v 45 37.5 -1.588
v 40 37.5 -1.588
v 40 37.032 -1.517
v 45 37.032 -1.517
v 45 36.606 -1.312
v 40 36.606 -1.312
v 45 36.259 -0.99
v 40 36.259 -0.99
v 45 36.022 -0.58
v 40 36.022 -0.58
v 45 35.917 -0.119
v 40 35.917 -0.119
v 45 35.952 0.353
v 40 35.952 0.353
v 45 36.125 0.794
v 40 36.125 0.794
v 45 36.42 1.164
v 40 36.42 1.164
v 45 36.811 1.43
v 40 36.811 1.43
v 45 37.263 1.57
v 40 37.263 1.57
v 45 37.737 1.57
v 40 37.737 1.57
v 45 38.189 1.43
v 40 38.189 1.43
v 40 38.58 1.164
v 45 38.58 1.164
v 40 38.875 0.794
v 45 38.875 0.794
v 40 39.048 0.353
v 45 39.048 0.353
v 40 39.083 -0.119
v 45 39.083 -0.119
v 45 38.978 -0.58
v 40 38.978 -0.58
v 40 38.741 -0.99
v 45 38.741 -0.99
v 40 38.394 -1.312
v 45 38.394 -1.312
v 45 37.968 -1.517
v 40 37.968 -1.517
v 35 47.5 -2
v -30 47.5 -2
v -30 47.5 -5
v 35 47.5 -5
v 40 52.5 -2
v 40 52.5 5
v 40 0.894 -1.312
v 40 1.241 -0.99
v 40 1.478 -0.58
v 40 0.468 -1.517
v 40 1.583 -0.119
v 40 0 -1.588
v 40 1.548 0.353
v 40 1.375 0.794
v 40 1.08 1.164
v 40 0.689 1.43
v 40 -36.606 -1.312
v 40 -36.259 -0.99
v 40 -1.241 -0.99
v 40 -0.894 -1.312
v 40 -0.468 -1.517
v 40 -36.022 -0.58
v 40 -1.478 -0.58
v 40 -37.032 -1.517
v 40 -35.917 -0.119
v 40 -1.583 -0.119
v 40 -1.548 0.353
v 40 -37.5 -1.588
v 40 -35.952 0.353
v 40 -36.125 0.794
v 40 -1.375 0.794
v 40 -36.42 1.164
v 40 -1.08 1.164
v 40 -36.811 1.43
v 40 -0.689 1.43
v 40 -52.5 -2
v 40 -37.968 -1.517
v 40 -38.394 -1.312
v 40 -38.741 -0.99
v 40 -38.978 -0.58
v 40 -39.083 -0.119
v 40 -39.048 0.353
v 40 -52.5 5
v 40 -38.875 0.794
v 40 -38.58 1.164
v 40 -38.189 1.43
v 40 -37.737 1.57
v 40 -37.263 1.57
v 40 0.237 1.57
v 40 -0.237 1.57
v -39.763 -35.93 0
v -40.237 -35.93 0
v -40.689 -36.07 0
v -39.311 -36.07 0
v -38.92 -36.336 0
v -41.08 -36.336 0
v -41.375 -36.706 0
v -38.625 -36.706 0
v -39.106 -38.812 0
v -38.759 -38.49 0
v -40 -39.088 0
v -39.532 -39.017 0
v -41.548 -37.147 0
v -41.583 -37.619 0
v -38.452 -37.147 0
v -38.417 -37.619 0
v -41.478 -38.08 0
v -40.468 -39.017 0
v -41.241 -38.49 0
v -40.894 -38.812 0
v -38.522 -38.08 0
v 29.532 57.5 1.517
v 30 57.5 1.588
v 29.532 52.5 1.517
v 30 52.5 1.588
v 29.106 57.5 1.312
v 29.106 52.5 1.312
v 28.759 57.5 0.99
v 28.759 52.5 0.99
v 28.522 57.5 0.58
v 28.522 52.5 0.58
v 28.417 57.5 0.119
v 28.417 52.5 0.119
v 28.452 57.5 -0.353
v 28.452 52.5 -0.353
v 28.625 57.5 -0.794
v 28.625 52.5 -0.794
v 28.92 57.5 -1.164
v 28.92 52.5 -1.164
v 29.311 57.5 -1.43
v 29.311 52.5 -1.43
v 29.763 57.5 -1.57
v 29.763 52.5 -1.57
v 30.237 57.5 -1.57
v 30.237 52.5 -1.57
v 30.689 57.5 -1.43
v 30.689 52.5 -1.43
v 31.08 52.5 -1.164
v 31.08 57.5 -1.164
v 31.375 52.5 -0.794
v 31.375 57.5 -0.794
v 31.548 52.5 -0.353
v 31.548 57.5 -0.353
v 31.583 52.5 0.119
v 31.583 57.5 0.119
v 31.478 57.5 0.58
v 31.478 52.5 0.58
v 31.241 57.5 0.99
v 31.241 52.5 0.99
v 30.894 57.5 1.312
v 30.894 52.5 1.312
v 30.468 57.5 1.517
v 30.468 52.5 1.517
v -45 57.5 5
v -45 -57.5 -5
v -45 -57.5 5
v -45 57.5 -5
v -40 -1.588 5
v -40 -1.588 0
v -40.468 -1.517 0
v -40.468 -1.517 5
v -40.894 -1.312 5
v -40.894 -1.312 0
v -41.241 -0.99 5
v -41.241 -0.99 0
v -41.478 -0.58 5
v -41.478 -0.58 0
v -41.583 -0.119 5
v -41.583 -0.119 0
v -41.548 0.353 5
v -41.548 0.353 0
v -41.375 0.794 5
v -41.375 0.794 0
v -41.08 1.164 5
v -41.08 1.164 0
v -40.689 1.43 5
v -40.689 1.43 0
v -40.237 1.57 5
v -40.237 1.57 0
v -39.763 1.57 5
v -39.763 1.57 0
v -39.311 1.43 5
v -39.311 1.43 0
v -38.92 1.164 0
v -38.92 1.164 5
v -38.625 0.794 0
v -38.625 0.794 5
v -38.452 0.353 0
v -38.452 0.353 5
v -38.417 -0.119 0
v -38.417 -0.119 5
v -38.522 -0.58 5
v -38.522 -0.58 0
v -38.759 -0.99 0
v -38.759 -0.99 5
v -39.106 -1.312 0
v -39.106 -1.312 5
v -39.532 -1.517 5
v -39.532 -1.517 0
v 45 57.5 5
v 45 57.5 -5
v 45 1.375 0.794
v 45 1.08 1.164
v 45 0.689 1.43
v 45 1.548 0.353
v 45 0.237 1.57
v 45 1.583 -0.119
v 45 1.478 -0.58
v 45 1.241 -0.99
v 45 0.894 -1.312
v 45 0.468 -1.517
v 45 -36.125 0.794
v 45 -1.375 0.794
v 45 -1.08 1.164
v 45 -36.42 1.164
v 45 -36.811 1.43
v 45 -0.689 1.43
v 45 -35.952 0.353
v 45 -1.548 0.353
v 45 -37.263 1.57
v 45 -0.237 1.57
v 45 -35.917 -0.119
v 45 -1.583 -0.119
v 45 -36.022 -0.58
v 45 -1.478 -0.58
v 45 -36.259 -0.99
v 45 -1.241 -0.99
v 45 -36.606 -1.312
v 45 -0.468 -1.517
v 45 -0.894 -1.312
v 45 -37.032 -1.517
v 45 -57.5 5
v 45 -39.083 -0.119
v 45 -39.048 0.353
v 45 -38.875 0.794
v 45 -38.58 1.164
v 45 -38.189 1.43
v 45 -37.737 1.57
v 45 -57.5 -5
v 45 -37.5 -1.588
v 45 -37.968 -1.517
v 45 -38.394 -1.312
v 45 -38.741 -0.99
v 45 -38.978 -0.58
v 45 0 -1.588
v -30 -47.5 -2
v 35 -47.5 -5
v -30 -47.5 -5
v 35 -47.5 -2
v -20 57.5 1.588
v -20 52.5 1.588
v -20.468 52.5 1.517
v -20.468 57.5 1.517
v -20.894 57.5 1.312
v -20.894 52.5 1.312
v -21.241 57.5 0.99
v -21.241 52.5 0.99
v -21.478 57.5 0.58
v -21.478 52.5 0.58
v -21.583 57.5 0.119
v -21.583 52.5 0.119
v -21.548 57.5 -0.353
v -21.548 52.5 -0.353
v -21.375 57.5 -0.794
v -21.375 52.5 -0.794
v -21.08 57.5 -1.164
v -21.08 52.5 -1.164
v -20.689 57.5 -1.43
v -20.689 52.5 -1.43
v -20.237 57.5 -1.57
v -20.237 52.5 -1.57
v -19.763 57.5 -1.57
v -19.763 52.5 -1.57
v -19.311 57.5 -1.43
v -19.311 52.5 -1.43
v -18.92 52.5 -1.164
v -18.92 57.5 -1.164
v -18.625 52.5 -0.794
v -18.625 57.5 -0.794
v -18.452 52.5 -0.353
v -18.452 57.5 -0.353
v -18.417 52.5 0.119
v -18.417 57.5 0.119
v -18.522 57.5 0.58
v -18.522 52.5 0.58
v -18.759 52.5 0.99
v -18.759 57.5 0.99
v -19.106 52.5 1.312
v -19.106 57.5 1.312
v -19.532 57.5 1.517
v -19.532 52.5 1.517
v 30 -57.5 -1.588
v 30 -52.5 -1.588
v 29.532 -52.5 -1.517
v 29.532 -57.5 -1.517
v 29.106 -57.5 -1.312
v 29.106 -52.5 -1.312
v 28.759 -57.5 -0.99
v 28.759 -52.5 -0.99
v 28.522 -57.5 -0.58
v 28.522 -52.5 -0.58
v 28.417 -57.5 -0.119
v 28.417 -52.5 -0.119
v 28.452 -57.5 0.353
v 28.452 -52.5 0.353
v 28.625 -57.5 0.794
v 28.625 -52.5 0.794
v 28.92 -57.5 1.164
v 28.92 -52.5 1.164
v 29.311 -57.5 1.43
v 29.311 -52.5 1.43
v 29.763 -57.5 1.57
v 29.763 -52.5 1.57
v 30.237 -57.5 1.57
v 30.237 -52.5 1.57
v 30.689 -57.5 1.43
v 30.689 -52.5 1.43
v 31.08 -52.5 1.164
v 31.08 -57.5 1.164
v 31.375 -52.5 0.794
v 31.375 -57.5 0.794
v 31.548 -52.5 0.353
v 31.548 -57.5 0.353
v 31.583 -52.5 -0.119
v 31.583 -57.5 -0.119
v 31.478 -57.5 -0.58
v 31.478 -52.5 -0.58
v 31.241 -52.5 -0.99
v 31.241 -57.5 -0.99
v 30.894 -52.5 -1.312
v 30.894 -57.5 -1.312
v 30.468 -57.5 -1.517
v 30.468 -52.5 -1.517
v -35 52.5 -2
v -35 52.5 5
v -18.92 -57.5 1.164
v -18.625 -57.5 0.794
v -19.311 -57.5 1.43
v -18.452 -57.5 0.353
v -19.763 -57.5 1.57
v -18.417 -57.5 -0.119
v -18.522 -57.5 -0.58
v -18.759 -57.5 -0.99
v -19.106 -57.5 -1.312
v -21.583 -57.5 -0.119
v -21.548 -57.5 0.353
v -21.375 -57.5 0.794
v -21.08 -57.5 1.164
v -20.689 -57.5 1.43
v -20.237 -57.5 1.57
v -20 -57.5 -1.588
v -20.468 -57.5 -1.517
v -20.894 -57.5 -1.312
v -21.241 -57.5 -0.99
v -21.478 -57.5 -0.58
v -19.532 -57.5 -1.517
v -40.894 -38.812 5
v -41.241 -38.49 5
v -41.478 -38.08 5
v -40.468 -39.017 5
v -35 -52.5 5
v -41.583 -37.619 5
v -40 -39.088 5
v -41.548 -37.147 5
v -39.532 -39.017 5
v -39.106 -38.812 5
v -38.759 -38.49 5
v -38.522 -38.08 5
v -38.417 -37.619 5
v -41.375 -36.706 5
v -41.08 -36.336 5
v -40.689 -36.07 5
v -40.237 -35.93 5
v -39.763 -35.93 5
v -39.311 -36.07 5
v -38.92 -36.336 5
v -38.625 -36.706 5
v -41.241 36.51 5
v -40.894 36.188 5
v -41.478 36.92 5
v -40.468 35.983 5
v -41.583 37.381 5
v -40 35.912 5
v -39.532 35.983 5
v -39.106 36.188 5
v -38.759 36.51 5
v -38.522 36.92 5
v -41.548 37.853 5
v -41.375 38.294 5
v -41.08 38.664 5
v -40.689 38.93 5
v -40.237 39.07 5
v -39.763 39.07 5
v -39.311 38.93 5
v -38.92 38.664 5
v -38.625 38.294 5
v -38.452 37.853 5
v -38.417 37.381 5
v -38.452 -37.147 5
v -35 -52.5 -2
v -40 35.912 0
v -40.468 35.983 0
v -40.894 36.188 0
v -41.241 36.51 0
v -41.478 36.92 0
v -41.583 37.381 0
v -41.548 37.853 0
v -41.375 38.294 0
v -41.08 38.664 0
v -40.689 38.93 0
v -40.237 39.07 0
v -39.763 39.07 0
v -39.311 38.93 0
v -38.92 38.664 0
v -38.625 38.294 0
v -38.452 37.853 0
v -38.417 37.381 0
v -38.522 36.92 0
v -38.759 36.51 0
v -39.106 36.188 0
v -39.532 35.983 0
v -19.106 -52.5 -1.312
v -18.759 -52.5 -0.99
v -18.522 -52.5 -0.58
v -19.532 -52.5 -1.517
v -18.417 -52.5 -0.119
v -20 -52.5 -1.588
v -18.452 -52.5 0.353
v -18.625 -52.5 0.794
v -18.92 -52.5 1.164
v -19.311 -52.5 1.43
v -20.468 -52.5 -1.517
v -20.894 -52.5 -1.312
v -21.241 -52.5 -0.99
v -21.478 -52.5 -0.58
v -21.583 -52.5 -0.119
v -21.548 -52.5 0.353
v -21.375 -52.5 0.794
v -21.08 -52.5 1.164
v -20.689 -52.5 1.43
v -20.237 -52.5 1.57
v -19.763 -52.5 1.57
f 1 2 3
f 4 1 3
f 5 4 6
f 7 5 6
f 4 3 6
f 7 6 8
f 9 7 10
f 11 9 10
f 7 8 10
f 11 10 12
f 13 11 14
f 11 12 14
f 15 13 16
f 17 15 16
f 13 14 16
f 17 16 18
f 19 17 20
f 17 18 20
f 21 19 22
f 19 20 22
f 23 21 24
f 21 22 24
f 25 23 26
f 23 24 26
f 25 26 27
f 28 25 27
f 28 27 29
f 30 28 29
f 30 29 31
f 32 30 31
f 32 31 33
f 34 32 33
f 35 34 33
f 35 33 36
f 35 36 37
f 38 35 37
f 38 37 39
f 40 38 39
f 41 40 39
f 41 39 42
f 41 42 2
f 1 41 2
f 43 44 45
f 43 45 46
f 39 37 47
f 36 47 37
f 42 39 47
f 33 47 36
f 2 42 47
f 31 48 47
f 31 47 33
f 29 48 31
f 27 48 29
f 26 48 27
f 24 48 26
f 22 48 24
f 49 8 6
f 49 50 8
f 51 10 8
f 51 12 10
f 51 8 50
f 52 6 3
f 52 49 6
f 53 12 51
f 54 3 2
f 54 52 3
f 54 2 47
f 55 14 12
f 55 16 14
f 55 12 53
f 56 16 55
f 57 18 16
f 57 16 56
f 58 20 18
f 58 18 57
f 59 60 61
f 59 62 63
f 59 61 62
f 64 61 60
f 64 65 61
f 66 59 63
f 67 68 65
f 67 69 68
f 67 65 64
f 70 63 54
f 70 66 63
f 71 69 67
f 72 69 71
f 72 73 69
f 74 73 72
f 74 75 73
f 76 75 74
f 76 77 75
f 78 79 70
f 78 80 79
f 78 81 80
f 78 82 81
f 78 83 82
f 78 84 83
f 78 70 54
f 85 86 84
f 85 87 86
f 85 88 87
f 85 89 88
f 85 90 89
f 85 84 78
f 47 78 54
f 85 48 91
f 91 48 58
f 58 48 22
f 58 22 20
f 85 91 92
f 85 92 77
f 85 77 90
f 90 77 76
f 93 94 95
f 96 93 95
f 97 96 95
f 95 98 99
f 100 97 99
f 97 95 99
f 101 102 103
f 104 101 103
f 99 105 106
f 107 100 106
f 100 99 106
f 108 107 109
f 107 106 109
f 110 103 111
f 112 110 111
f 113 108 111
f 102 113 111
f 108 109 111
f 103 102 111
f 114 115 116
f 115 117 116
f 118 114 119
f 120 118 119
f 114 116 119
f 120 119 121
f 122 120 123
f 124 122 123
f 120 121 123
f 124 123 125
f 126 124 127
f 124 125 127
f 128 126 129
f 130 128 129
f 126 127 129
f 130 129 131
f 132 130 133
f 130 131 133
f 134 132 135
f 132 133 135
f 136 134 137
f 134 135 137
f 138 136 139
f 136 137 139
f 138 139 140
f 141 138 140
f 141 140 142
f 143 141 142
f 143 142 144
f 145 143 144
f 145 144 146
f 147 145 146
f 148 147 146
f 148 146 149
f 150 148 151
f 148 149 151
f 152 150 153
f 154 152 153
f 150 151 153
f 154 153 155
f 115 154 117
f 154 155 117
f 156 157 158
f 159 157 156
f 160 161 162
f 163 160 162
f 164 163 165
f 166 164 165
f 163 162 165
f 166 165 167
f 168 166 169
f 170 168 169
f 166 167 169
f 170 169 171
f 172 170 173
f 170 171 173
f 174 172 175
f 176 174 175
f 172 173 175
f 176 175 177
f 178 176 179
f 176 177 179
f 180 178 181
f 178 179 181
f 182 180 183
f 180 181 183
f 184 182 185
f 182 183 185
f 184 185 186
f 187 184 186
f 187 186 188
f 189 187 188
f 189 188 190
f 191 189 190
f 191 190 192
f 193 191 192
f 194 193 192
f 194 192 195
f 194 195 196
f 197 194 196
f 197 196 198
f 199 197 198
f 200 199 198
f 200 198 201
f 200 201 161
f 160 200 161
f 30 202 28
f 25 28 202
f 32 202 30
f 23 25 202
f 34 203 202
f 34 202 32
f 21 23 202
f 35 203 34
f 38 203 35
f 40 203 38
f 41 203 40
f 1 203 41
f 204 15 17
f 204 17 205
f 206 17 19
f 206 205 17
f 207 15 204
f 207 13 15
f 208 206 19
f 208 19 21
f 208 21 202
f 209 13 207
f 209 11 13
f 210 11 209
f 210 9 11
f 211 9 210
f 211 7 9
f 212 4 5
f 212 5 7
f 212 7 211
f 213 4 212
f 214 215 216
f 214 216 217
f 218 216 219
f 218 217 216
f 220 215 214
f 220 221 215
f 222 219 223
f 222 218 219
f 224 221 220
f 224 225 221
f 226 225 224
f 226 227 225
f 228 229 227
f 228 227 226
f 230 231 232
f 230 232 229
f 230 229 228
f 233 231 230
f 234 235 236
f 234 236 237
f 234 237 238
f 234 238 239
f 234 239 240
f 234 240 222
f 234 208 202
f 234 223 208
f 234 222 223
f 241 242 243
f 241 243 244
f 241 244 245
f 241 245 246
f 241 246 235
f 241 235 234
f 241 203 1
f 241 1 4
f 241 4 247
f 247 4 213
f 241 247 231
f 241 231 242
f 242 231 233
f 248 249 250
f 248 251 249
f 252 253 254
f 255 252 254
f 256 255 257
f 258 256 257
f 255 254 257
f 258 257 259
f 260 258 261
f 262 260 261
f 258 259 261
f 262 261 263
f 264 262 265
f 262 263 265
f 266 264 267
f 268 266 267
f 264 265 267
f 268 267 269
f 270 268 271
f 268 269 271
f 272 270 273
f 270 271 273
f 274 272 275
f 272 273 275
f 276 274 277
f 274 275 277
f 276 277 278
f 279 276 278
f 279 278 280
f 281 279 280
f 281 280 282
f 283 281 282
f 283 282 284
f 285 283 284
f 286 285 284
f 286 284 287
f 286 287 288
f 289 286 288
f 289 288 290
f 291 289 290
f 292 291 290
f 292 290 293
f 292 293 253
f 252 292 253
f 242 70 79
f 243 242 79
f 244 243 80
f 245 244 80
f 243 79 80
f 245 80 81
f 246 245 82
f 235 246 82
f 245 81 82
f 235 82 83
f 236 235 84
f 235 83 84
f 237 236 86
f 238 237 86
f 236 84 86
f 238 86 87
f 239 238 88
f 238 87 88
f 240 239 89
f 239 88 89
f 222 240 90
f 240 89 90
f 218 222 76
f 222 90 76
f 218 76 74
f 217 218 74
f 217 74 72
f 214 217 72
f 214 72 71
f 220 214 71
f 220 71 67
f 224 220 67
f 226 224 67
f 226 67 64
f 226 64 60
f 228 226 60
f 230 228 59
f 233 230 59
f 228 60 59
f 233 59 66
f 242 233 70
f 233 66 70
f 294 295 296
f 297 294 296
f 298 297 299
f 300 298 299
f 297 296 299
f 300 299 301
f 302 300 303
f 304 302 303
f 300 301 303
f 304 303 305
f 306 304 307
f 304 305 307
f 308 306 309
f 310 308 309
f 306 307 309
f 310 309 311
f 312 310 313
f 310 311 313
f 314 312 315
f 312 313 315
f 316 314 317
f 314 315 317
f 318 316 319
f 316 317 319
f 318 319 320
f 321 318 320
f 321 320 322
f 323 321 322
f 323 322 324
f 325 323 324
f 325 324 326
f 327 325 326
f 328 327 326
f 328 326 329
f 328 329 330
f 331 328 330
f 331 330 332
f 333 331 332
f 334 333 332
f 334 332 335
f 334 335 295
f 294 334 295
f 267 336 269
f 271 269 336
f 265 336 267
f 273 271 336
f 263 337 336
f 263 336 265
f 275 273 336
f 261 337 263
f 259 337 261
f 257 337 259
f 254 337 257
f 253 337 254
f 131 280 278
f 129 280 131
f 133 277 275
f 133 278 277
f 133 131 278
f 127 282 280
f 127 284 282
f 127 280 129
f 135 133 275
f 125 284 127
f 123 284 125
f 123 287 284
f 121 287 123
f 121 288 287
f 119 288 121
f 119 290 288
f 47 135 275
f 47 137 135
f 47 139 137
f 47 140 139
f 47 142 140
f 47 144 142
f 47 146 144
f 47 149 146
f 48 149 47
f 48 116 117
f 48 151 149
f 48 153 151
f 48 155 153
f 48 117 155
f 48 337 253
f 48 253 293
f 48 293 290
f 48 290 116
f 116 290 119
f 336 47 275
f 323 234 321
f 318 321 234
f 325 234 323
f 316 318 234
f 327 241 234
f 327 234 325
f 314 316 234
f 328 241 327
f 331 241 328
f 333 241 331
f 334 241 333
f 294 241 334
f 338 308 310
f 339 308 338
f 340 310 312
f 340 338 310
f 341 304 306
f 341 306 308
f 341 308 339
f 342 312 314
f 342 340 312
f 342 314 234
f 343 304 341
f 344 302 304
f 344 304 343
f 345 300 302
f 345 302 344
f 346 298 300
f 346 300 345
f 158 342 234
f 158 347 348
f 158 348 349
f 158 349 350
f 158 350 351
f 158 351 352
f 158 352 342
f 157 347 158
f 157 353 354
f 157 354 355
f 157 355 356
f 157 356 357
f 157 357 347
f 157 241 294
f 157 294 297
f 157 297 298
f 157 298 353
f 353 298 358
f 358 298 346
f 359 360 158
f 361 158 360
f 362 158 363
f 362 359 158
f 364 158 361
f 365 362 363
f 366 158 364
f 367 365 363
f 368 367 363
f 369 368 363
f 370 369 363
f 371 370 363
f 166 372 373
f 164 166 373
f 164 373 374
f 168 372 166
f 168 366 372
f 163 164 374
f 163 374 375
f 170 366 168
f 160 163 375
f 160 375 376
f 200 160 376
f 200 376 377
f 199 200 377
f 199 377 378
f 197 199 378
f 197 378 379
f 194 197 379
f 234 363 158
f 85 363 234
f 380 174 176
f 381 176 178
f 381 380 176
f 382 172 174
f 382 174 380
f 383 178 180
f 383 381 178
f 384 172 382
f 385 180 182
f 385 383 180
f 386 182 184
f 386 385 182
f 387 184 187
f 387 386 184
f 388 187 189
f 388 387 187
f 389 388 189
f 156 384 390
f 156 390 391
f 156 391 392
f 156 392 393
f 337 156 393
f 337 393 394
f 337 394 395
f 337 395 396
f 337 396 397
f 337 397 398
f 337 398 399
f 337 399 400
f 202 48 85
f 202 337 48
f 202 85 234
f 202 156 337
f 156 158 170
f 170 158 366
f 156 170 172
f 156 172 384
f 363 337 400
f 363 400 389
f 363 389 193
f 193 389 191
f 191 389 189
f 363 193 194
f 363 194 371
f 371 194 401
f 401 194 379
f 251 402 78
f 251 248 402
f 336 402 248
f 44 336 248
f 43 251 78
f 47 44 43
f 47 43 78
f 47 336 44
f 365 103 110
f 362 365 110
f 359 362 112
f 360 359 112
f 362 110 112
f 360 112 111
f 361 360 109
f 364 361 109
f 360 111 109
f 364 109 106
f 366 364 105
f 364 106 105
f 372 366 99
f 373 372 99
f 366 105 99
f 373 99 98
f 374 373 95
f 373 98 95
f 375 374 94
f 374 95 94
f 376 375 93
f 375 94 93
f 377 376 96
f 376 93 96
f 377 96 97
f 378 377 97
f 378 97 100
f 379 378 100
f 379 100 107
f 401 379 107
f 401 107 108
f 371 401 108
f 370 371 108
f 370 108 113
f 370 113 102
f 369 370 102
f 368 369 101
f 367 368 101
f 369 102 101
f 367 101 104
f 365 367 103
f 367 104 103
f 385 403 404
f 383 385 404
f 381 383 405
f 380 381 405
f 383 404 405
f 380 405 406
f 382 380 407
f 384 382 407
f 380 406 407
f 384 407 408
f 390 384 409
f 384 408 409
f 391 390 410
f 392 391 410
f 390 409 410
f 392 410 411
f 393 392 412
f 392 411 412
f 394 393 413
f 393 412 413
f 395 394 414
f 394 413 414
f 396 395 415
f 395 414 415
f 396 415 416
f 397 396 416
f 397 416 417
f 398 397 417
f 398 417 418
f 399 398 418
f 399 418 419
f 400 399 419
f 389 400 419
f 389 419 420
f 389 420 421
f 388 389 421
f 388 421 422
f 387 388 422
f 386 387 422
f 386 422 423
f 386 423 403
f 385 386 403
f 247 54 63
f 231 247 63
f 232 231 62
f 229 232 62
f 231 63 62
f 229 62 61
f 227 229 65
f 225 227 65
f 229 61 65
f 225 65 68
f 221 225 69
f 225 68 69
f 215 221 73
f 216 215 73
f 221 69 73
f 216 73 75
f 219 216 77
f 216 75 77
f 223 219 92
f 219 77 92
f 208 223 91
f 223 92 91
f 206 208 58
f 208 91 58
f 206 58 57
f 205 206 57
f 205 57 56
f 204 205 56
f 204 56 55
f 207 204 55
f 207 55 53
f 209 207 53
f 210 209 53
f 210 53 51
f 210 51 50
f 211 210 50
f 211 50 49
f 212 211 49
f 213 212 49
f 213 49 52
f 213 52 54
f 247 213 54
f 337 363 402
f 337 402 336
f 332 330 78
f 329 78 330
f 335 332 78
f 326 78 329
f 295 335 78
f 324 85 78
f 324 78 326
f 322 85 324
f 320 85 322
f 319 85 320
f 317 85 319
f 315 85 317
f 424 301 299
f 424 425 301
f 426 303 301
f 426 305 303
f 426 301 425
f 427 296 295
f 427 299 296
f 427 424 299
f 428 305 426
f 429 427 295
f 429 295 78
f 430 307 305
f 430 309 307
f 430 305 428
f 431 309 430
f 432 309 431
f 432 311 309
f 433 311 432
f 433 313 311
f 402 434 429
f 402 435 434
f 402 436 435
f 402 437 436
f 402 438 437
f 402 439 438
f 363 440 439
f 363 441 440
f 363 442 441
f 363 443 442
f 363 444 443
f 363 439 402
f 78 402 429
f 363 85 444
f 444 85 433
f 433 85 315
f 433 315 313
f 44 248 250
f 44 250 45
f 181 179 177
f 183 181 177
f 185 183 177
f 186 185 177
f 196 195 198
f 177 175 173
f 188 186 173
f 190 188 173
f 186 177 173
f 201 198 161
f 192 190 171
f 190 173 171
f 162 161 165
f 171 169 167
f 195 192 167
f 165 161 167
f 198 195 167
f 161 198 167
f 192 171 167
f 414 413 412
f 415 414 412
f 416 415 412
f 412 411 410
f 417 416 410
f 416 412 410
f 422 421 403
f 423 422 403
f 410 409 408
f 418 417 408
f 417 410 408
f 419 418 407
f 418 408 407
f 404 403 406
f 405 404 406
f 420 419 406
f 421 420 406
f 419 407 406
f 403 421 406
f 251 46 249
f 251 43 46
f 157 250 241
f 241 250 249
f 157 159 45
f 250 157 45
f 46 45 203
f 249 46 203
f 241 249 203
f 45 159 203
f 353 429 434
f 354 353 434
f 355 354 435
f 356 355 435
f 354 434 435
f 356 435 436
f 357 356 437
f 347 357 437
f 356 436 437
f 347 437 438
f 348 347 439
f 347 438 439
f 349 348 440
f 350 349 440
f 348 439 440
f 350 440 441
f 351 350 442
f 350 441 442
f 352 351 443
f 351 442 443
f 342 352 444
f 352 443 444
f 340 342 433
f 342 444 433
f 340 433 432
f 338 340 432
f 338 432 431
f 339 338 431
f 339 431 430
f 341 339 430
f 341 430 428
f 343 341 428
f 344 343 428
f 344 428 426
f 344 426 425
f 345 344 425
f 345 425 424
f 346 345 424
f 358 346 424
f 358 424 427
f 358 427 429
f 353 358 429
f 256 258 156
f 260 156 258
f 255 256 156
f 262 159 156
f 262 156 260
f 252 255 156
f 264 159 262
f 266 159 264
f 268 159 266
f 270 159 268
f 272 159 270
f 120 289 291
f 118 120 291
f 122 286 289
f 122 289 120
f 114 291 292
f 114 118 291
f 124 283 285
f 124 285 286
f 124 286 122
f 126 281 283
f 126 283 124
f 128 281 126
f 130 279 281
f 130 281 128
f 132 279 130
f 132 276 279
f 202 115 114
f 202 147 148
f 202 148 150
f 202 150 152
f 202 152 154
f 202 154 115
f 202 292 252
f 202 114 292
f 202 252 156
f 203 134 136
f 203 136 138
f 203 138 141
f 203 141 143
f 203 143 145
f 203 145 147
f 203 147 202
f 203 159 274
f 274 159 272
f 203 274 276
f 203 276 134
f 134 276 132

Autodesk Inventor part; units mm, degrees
ref_plane "YZ Plane" through (0, 0, 0) normal (1, 0, 0) x (0, 1, 0)
ref_plane "XZ Plane" through (0, 0, 0) normal (0, 1, 0) x (-1, 0, 0)
ref_plane "XY Plane" through (0, 0, 0) normal (0, 0, 1) x (1, 0, 0)
sketch "Sketch1" plane through (0, 0, 0) normal (0, 0, 1) x (1, 0, 0)
  line L0 (-45, 57.5) -> (45, 57.5)
  line L1 (45, 57.5) -> (45, -57.5)
  line L2 (45, -57.5) -> (-45, -57.5)
  line L3 (-45, -57.5) -> (-45, 57.5)
  line L4 (-45, 57.5) -> (45, -57.5) construction
  line L5 (45, 57.5) -> (-45, -57.5) construction
  point P0 (0, 0)
  dimension "d0" = 90
  dimension "d1" = 115
extrude "Extrusion1" add sketch "Sketch1" along normal mid plane 10
sketch "Sketch2" plane through (45, -57.5, 5) normal (1, 0, 0) x (0, 0, -1)
  line L0 (10, 0) -> (0, 0) projected
  line L1 (10, 115) -> (10, 0) projected
  point P0 (5, 57.5)
  point P1 (5, 20)
  point P2 (5, 57.5)
  point P3 (5, 95)
  dimension "d4" = 20
  dimension "d5" = 5
  dimension "d8" = 37.5
hole "Hole1" at (45, -37.5, 0) at (45, 0, 0) at (45, 37.5, 0) direction (-1, 0, 0) diameter 3.175 depth 5
sketch "Sketch3" plane through (-45, -57.5, 5) normal (0, -1, 0) x (1, 0, 0)
  line L0 (0, 0) -> (0, -10) projected
  line L1 (90, -10) -> (0, -10) projected
  point P0 (45, -5)
  point P1 (25, -5)
  point P2 (75, -5)
  dimension "d20" = 25
  dimension "d21" = 5
  dimension "d24" = 50
hole "Hole2" at (-20, -57.5, 0) at (30, -57.5, 0) direction (0, 1, 0) diameter 3.175 depth 5
sketch "Sketch4" plane through (-45, 57.5, 5) normal (0, 1, 0) x (1, 0, 0)
  line L0 (0, 10) -> (0, 0) projected
  line L1 (90, 0) -> (0, 0) projected
  point P0 (45, 5)
  point P1 (25, 5)
  point P2 (75, 5)
  dimension "d36" = 25
  dimension "d37" = 5
  dimension "d40" = 50
hole "Hole3" at (-20, 57.5, 0) at (30, 57.5, 0) direction (0, -1, 0) diameter 3.175 depth 5
sketch "Sketch5" plane through (0, 0, 5) normal (0, 0, 1) x (1, 0, 0)
  line L0 (-45, 57.5) -> (-45, -57.5) projected
  line L1 (-45, -57.5) -> (45, -57.5) projected
  point P0 (0, 0)
  point P1 (-40, -37.5)
  point P2 (-40, 0)
  point P3 (-40, 37.5)
  dimension "d52" = 5
  dimension "d53" = 20
  dimension "d56" = 37.5
hole "Hole4" at (-40, -37.5, 5) at (-40, 0, 5) at (-40, 37.5, 5) direction (0, 0, -1) diameter 3.175 depth 5
sketch "Sketch6" plane through (0, 0, 5) normal (0, 0, 1) x (1, 0, 0)
  line L0 (40, -52.5) -> (-35, -52.5)
  line L1 (-35, -52.5) -> (-35, 52.5)
  line L2 (-35, 52.5) -> (40, 52.5)
  line L3 (40, 52.5) -> (40, -52.5)
  line L4 (40, -52.5) -> (-35, 52.5) construction
  line L5 (-35, -52.5) -> (40, 52.5) construction
  line L6 (-45, 57.5) -> (-45, -57.5) projected
  line L7 (45, 57.5) -> (-45, 57.5) projected
  line L8 (45, -57.5) -> (45, 57.5) projected
  line L9 (-45, -57.5) -> (45, -57.5) projected
  point P0 (0, 0)
  point P1 (2.5, 0)
  dimension "d68" = 10
  dimension "d69" = 5
  dimension "d72" = 5
  dimension "d74" = 5
extrude "Extrusion2" cut sketch "Sketch6" against normal blind 7 contours L0 L1 L2 L3
sketch "Sketch7" plane through (0, 0, -2) normal (0, 0, 1) x (1, 0, 0)
  line L0 (35, -47.5) -> (-30, -47.5)
  line L1 (-30, -47.5) -> (-30, 47.5)
  line L2 (-30, 47.5) -> (35, 47.5)
  line L3 (35, 47.5) -> (35, -47.5)
  line L4 (35, -47.5) -> (-30, 47.5) construction
  line L5 (-30, -47.5) -> (35, 47.5) construction
  line L6 (40, 52.5) -> (40, -52.5) projected
  line L7 (-35, -52.5) -> (-35, 52.5) projected
  line L8 (-35, 52.5) -> (40, 52.5) projected
  line L9 (40, -52.5) -> (-35, -52.5) projected
  point P0 (0, 0)
  point P1 (2.5, 0)
  dimension "d77" = 5
  dimension "d78" = 5
  dimension "d79" = 5
  dimension "d81" = 5
extrude "Extrusion3" cut sketch "Sketch7" against normal through all contours L0 L1 L2 L3
properties part number "leftright"
